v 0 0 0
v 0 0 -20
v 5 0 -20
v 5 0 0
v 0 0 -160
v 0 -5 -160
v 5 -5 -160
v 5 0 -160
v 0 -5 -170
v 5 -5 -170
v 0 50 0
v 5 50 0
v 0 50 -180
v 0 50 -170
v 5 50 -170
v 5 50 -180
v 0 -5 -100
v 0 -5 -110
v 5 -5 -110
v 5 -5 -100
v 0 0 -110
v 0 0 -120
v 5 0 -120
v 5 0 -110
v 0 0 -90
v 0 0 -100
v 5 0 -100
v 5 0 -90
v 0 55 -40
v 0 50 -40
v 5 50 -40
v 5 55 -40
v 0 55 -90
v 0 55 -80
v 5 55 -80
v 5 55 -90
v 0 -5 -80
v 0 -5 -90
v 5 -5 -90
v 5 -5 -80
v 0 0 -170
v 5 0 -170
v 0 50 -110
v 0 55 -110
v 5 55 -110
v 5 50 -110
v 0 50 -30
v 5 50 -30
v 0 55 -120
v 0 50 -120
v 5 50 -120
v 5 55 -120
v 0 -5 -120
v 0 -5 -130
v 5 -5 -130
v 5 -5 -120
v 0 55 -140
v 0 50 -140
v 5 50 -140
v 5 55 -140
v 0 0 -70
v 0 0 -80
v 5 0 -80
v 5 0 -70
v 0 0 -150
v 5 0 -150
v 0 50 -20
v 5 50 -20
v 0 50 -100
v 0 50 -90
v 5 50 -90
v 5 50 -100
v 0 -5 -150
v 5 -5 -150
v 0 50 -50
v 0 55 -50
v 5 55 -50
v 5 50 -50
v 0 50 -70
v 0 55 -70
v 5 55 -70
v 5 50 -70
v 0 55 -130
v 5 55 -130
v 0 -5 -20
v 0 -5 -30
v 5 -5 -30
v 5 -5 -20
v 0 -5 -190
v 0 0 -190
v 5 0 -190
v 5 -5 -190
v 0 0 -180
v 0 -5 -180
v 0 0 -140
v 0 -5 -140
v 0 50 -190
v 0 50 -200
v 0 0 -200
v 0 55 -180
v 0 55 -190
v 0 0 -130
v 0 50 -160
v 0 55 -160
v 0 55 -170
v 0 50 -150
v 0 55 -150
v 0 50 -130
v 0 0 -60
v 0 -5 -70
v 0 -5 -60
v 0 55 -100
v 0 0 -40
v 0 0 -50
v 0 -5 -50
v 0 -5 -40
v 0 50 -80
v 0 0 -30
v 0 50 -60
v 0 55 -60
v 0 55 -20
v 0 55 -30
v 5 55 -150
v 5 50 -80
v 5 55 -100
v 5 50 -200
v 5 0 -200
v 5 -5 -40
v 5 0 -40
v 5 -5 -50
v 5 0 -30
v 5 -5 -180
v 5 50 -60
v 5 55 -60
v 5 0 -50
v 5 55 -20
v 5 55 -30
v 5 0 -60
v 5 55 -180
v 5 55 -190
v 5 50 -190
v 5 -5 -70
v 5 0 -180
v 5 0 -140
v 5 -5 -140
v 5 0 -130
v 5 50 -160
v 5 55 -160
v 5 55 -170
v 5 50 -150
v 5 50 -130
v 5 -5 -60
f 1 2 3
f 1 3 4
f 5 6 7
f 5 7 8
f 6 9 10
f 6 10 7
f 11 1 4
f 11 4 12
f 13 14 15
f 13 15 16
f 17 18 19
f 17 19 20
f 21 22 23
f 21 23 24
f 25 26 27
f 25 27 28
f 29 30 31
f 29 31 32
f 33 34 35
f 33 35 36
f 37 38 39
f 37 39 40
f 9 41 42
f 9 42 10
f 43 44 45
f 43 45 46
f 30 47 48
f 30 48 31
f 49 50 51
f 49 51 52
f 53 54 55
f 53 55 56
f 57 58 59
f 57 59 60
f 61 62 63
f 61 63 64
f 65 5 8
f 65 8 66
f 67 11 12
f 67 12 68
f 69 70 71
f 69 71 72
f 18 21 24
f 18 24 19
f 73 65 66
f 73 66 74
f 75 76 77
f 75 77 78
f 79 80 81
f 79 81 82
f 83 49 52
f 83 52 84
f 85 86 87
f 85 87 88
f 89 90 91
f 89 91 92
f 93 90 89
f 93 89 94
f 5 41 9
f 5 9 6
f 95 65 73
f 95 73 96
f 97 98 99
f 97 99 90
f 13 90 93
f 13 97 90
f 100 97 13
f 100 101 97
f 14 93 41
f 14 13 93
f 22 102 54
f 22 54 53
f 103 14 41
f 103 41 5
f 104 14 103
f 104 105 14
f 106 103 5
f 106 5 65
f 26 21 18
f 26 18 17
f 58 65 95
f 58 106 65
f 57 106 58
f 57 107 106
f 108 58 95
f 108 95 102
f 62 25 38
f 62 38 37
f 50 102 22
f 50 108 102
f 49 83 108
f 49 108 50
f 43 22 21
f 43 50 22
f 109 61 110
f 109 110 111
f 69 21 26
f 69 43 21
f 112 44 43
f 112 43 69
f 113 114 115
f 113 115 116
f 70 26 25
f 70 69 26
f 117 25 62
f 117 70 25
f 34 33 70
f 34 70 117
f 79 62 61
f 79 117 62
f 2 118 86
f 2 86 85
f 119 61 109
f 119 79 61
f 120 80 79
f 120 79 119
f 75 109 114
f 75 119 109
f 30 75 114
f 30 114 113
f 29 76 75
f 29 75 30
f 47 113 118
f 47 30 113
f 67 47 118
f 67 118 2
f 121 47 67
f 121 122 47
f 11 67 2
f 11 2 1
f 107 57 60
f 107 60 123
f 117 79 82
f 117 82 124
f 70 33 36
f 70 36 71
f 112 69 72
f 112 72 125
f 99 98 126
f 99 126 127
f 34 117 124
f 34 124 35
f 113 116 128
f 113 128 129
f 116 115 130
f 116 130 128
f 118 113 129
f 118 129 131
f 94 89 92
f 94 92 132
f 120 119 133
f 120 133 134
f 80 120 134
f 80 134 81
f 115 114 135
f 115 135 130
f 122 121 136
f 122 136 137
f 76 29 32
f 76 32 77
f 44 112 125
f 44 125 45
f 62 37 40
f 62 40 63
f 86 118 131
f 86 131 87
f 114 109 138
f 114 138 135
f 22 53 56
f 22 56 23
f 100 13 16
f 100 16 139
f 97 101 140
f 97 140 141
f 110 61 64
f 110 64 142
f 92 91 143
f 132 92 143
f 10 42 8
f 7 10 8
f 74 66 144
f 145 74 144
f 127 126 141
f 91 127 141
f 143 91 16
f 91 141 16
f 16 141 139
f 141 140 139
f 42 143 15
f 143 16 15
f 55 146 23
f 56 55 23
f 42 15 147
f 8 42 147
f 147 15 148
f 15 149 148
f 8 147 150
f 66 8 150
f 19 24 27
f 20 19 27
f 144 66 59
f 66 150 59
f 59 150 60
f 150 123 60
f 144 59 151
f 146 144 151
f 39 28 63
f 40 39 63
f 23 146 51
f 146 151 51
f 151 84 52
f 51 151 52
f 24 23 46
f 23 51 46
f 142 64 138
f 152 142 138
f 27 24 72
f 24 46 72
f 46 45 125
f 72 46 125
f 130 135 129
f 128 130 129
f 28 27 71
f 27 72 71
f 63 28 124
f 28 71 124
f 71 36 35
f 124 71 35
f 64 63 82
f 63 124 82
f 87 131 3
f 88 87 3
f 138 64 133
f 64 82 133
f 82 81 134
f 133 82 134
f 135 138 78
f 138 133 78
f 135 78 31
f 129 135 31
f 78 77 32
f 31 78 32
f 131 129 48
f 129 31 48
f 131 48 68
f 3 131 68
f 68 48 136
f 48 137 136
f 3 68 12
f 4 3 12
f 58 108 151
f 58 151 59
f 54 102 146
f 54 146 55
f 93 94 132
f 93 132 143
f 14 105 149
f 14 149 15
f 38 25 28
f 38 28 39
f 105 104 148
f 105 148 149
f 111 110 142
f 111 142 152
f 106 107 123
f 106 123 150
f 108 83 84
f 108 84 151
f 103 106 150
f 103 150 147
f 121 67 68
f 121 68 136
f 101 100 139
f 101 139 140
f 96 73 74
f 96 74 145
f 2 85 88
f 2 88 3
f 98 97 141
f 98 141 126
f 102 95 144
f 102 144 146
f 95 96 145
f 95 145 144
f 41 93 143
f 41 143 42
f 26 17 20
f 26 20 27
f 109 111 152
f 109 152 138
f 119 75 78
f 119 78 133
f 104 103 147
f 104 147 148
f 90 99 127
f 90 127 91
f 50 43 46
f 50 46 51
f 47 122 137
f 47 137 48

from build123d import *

# Parameters (mm, degrees)
BOSS_EXTRUDE1_DEPTH = 5


with BuildPart() as part:
    # Sketch1 → Boss-Extrude1 (new body)
    with BuildSketch(Plane(origin=(0, 0, 0), x_dir=(0, 0, -1), z_dir=(1, 0, 0))):
        Polygon((40, 50), (40, 55), (50, 55), (50, 50), (60, 50), (60, 55), (70, 55), (70, 50), (80, 50), (80, 55), (90, 55), (90, 50), (100, 50), (100, 55), (110, 55), (110, 50), (120, 50), (120, 55), (130, 55), (130, 50), (140, 50), (140, 55), (150, 55), (150, 50), (160, 50), (160, 55), (170, 55), (170, 50), (180, 50), (180, 55), (190, 55), (190, 50), (200, 50), (200, 0), (190, 0), (190, -5), (180, -5), (180, 0), (170, 0), (170, -5), (160, -5), (160, 0), (150, 0), (150, -5), (140, -5), (140, 0), (130, 0), (130, -5), (120, -5), (120, 0), (110, 0), (110, -5), (100, -5), (100, 0), (90, 0), (90, -5), (80, -5), (80, 0), (70, 0), (70, -5), (60, -5), (60, 0), (50, 0), (50, -5), (40, -5), (40, 0), (30, 0), (30, -5), (20, -5), (20, 0), (0, 0), (0, 50), (20, 50), (20, 55), (30, 55), (30, 50), align=None)
    extrude(amount=BOSS_EXTRUDE1_DEPTH)


solid = part.part
